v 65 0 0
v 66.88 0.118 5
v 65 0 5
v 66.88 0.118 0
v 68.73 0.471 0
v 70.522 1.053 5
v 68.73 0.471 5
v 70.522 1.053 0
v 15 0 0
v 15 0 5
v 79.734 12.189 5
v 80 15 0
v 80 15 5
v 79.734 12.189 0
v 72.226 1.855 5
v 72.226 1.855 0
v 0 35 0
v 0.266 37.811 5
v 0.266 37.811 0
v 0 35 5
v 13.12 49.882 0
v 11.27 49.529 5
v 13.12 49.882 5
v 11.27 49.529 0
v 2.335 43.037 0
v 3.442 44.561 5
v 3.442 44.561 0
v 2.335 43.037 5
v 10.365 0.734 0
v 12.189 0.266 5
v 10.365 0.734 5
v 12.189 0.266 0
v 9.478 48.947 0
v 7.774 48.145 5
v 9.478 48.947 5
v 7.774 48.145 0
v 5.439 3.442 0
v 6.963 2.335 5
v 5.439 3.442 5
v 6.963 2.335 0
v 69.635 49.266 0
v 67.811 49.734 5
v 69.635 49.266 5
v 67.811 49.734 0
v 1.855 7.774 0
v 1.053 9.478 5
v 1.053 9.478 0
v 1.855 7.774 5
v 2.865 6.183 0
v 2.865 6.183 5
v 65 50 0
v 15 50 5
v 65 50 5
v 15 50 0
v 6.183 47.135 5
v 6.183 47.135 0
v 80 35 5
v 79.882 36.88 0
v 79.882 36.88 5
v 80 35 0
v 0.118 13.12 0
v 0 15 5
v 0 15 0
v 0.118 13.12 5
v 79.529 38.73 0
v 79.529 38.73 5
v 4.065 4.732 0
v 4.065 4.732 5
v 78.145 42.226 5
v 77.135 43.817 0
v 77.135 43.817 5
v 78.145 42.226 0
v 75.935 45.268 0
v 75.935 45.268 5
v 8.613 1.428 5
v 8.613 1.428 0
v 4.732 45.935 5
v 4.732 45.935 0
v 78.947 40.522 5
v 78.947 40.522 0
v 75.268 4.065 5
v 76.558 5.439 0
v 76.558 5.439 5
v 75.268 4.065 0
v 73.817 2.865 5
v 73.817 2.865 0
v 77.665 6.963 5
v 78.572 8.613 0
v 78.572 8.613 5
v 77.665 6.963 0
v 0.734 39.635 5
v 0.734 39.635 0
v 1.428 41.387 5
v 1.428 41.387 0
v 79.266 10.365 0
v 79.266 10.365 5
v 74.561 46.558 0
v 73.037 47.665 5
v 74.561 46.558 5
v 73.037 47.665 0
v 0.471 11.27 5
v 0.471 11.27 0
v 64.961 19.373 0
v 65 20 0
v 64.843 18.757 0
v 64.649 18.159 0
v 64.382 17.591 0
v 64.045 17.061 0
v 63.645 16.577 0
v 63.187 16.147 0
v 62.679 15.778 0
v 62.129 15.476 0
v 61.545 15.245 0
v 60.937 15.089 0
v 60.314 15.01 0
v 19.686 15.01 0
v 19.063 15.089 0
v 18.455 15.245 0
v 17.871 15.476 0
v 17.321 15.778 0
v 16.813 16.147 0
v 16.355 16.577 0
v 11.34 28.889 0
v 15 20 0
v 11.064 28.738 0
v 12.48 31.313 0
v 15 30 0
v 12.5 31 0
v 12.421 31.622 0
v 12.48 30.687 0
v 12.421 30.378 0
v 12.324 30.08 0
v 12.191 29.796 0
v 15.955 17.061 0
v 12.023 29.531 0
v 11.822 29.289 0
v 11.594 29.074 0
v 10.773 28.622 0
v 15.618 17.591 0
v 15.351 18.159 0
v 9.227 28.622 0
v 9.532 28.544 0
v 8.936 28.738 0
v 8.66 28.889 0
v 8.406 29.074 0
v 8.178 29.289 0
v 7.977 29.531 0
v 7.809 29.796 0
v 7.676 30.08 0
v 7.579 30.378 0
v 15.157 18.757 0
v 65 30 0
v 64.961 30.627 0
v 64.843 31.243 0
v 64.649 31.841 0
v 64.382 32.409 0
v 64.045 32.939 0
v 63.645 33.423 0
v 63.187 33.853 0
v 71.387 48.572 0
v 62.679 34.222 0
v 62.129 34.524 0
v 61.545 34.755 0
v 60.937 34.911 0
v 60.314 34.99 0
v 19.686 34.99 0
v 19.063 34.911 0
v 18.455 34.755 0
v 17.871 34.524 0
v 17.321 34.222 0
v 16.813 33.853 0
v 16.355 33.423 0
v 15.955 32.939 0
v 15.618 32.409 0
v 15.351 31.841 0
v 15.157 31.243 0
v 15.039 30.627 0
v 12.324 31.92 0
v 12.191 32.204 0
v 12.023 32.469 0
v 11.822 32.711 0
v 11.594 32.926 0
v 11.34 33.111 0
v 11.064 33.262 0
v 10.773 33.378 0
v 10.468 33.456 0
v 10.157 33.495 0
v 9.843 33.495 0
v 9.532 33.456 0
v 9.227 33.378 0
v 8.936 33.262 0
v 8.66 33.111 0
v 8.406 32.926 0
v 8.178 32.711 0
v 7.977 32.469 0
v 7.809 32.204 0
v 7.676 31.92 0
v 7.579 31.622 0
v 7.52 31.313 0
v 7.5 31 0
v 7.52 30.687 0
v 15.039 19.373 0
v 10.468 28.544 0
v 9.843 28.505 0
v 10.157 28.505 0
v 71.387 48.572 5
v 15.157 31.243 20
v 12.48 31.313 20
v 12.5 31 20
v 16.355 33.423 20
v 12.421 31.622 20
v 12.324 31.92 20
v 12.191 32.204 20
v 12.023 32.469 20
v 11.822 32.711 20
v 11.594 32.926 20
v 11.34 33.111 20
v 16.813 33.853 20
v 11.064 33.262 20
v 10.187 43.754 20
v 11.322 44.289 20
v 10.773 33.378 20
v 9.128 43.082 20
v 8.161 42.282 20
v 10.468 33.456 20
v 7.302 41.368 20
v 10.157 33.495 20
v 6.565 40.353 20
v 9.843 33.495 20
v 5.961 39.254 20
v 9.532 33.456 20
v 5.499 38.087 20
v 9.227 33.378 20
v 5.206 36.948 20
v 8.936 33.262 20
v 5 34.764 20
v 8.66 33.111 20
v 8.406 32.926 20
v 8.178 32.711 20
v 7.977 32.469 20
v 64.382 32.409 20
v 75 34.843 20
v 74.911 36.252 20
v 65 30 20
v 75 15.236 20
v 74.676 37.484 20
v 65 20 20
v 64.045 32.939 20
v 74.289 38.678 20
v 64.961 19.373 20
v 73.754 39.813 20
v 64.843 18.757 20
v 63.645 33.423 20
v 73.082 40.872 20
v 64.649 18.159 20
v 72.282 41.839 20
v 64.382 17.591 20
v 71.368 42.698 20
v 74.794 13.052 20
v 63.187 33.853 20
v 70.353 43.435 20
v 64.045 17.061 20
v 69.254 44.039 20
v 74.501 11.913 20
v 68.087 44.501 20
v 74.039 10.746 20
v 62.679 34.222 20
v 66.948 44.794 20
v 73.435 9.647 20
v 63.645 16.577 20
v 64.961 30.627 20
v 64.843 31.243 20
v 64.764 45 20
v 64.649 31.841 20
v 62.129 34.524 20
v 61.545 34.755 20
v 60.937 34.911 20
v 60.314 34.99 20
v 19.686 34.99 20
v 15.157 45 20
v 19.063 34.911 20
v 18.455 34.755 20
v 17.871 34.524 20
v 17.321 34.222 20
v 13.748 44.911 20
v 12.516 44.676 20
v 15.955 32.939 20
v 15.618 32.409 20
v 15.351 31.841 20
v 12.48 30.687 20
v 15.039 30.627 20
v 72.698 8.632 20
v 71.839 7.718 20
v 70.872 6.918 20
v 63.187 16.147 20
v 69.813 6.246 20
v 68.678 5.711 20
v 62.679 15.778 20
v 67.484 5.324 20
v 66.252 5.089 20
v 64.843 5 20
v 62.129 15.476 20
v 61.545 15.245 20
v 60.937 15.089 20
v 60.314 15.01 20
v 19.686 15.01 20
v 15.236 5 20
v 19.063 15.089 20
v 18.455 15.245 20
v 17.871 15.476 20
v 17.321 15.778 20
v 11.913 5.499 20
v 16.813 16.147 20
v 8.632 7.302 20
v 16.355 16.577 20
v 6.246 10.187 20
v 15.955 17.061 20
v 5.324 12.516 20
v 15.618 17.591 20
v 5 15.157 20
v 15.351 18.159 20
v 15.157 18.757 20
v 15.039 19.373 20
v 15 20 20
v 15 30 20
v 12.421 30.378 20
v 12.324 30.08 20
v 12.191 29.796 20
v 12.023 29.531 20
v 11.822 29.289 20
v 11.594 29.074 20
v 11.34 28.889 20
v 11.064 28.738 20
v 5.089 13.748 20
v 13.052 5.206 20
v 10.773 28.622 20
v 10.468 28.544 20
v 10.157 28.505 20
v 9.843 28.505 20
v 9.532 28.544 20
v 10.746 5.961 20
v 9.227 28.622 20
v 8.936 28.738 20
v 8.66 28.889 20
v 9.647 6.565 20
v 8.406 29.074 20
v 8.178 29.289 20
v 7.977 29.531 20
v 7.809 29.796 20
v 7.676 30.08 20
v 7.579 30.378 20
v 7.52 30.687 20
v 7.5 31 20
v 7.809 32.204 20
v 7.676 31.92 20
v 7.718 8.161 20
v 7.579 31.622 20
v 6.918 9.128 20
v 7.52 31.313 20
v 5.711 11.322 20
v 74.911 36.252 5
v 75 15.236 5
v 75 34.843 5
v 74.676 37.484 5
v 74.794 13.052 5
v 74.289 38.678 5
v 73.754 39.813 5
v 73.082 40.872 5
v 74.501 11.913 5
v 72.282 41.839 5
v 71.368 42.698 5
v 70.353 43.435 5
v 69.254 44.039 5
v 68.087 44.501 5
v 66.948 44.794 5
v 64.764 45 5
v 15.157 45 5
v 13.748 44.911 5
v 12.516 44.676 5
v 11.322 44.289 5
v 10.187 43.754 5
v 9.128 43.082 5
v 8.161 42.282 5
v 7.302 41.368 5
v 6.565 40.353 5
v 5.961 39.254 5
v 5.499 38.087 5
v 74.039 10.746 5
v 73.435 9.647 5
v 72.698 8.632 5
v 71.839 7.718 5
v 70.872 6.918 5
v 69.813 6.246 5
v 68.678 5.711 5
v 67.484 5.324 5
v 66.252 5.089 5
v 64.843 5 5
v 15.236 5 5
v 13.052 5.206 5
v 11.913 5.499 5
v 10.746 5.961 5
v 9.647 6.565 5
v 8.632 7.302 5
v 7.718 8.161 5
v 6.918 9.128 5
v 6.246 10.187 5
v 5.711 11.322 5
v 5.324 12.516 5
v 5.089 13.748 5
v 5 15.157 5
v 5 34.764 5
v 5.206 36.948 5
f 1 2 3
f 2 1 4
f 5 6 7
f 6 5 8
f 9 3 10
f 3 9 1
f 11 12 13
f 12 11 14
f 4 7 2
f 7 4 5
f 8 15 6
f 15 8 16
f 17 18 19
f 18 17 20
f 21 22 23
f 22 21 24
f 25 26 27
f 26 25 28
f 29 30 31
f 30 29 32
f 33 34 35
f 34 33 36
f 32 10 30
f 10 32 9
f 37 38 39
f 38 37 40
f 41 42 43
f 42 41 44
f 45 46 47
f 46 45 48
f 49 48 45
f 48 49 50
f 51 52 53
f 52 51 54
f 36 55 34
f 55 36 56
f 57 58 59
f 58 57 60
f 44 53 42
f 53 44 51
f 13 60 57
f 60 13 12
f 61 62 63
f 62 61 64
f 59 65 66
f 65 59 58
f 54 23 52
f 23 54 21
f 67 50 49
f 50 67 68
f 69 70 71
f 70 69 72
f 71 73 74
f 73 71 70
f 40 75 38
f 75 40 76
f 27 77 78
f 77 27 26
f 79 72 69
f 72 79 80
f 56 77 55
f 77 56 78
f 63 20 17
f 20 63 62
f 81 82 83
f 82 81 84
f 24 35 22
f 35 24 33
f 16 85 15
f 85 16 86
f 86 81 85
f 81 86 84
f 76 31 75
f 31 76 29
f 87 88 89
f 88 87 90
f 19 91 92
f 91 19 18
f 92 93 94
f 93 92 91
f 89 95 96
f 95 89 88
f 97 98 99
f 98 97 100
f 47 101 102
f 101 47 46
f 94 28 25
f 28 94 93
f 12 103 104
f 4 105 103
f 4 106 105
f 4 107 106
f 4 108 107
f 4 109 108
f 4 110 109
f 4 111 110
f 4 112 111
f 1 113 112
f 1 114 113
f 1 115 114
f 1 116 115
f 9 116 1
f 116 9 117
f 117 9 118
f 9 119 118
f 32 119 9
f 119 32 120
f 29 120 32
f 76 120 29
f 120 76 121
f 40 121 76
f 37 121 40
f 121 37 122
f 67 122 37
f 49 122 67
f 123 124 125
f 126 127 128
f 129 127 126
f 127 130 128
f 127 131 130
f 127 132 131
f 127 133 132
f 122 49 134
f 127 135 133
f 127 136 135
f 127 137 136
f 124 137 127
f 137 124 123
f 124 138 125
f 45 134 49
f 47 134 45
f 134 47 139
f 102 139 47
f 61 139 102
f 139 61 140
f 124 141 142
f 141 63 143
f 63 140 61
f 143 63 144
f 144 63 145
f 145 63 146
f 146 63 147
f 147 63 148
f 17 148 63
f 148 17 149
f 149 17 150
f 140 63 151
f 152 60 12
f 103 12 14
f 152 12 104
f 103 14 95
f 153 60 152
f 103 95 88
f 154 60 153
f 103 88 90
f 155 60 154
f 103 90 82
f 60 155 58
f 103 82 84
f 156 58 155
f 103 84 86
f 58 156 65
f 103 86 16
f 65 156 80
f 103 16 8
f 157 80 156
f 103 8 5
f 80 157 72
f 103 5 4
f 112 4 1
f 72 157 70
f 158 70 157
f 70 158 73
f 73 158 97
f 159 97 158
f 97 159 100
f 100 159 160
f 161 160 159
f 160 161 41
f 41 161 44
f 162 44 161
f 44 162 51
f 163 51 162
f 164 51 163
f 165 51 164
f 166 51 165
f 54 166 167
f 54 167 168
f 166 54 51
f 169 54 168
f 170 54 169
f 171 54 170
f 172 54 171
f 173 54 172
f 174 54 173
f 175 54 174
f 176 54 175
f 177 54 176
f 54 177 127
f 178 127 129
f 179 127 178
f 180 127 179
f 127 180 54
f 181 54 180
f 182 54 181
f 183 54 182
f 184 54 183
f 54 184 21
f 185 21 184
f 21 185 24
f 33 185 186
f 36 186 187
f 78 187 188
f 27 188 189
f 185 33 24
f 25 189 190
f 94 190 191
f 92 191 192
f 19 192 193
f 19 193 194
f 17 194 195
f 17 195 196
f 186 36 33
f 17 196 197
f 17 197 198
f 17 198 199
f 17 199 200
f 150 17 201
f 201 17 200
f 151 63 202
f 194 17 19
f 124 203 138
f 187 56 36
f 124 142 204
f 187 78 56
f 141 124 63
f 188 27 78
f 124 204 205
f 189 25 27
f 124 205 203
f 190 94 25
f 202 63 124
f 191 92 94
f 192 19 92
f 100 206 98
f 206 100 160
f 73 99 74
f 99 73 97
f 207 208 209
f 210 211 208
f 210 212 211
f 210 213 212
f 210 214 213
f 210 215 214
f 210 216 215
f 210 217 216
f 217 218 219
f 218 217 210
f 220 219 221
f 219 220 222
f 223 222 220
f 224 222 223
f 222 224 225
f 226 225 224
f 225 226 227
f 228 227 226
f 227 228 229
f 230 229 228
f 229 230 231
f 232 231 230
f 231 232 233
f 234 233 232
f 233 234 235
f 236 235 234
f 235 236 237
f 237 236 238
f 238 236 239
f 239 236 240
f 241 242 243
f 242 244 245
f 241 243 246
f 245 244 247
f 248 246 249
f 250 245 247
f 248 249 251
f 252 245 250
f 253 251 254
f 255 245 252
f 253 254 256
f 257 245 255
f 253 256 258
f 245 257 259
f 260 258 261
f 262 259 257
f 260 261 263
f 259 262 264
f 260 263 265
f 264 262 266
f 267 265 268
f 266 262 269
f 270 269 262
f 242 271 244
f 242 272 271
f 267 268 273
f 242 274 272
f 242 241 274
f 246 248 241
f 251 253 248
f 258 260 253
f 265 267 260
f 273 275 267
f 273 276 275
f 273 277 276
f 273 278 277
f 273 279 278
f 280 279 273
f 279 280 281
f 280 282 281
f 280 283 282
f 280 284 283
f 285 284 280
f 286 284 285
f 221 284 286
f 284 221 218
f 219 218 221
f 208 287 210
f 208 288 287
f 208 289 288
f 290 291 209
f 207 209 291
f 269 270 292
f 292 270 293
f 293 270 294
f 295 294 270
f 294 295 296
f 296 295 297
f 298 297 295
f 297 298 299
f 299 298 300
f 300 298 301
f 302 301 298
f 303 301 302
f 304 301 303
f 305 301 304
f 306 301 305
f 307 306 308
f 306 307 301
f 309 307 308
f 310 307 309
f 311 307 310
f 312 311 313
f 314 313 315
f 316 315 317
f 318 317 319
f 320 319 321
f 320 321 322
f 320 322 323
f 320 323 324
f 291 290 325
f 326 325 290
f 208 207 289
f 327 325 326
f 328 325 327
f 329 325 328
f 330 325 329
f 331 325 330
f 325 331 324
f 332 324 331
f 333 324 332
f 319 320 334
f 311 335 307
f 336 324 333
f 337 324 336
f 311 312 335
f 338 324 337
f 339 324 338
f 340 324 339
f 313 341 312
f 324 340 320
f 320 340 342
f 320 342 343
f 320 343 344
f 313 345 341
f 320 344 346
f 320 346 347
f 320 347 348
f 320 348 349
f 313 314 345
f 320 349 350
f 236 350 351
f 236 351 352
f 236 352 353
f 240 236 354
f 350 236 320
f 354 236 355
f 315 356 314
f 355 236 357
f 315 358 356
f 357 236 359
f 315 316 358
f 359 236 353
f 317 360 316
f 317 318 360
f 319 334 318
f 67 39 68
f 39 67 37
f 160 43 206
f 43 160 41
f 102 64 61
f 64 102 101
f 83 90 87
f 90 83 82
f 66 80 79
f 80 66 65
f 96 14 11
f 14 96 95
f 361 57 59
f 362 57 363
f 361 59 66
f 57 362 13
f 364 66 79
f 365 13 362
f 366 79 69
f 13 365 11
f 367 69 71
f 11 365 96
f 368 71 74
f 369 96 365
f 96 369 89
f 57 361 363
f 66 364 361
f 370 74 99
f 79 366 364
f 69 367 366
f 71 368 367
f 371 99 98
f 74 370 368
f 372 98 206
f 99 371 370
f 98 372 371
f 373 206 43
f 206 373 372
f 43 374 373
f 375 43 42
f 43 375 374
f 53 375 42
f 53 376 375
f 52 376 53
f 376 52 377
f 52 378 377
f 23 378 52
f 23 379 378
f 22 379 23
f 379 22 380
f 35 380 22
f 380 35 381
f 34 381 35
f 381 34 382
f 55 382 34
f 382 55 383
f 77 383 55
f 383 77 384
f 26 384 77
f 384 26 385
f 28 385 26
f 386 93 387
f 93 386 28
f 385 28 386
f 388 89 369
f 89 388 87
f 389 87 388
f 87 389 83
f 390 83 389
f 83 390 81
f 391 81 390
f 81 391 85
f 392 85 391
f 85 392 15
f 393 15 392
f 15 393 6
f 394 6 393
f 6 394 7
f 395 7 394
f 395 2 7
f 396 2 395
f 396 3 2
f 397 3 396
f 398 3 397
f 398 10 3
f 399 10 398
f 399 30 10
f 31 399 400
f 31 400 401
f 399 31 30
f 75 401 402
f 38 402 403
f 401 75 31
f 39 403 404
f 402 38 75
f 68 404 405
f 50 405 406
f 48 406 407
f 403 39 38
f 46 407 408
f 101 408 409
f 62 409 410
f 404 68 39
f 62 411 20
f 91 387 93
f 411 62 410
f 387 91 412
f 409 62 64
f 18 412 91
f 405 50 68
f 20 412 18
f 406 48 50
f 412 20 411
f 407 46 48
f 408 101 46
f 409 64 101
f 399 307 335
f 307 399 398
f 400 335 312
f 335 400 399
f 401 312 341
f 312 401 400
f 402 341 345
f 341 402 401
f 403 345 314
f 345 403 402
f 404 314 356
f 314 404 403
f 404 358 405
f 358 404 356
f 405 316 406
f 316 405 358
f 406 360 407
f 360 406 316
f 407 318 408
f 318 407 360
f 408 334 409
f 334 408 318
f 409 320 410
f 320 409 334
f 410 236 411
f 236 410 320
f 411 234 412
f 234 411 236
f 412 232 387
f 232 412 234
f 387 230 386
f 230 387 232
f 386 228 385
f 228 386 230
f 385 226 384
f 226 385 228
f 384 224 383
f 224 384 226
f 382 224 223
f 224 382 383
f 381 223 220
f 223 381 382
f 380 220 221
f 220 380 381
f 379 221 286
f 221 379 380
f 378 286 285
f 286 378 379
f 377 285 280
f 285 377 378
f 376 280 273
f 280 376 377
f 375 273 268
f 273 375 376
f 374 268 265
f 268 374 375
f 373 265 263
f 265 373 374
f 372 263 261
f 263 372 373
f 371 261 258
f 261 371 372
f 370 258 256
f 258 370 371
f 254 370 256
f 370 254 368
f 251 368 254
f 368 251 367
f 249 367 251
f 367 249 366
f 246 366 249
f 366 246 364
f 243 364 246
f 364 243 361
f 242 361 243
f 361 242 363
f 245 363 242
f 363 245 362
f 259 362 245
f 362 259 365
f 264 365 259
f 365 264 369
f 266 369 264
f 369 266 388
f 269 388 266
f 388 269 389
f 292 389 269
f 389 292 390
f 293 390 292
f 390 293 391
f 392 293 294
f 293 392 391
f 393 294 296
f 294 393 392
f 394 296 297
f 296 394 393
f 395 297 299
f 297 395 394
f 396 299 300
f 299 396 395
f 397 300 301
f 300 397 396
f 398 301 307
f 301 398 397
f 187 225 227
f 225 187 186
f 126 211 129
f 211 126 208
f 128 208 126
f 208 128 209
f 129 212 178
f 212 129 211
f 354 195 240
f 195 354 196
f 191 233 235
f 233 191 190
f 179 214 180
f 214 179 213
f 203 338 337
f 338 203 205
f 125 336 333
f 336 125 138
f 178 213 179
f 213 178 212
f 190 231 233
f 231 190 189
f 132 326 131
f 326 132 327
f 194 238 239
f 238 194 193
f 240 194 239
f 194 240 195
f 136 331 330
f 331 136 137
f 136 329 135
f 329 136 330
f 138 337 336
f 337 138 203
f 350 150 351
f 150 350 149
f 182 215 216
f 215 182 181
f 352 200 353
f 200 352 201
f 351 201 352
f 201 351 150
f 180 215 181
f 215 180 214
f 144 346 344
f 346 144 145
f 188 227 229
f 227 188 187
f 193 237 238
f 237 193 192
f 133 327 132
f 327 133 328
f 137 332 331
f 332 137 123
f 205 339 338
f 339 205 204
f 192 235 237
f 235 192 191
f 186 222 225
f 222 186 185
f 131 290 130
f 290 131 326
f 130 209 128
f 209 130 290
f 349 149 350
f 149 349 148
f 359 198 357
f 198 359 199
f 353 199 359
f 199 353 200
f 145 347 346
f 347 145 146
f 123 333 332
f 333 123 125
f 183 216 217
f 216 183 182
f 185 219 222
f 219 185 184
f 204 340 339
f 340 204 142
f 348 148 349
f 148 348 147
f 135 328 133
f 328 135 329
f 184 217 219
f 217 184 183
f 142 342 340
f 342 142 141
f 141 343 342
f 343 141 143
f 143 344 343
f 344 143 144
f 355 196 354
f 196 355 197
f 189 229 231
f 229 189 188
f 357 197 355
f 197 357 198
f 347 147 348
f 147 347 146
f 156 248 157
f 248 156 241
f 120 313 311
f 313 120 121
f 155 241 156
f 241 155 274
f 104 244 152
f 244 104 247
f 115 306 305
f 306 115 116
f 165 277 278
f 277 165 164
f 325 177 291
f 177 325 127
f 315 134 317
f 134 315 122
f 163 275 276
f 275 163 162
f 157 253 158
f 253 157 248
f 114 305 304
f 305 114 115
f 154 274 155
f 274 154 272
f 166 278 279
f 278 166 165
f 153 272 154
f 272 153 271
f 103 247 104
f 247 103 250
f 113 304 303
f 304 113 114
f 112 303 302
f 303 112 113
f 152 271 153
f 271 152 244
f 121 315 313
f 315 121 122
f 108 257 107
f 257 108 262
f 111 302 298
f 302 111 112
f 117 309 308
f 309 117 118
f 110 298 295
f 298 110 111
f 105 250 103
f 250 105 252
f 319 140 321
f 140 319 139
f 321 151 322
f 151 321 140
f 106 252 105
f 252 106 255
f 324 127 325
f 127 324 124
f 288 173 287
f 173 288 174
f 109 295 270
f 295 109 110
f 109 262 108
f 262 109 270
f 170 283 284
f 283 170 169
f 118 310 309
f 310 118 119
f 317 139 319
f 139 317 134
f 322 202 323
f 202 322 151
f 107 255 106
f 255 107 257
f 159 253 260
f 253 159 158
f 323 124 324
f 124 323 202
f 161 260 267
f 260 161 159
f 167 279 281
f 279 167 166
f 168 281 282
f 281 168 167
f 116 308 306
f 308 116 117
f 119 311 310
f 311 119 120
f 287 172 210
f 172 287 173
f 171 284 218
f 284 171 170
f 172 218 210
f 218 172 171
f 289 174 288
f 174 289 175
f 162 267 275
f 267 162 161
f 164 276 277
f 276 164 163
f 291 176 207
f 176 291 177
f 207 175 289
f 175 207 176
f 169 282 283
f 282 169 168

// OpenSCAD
// Set resolution for circles and arcs
$fn = 50;

// Base 2D rectangle used for the main shape before rounding.
// When offset with a 15mm radius, it will produce a rounded rectangle with overall dimensions 80 x 50.
module base_rect() {
    // Place a 50mm x 20mm rectangle at (15,15) so that after a 15mm offset,
    // the rounded rectangle spans from (0,0) to (80,50).
    translate([15,15])
        square([50,20], center = false);
}

// Main 2D outline: a rounded rectangle (with a constant 15mm fillet on vertical edges)
module main_outline_2d() {
    offset(r=15, join_type="round")
        base_rect();
}

// Groove profile: the peripheral "ring" formed by the region between the main outline
// and an inner profile offset 5mm toward the center.
module groove_profile_2d() {
    difference() {
        // Outer boundary is the full main outline.
        main_outline_2d();
        // Inner boundary: contract the main outline by 5mm.
        offset(delta = -5, join_type = "round")
            main_outline_2d();
    }
}

// Slot profile: a rounded rectangle of size 50x20 with 5mm filleted corners.
// Constructed by taking a rectangle of size (50 - 2*5) x (20 - 2*5) = 40 x 10 (centered)
// and using a Minkowski sum with a circle of radius 5.
module slot_profile_2d() {
    minkowski() {
        square([40,10], center=true);
        circle(r=5);
    }
}

// Final model
// Start with the main body, then subtract the groove cut, a through hole, and the slot.
difference() {
    // Main body: extrude the rounded rectangle to 20mm in the Z direction.
    linear_extrude(height = 20)
        main_outline_2d();
    
    // Groove cut: remove a 15mm deep peripheral groove.
    // Positioned so that it removes material from z = 5mm to z = 20mm.
    translate([0,0,5])
        linear_extrude(height = 15)
            groove_profile_2d();
    
    // Through hole: a cylinder (5mm diameter) cut completely through the part.
    // The hole is positioned 10mm from the left edge (i.e. x = 10)
    // and 6mm above the horizontal midline (the midline in Y is at 25mm, so y = 31).
    translate([10,31,0])
        cylinder(d = 5, h = 22, center = false);
        // h = 22 to ensure it fully penetrates the 20mm thick part.
    
    // Rectangular slot: a through slot centered in the XY plane.
    // The slot is 50mm (X) x 20mm (Y) with 5mm filleted corners.
    // Since the part spans 80 x 50, its center is at (40,25).
    translate([40,25,0])
        linear_extrude(height = 20)
            slot_profile_2d();
}
